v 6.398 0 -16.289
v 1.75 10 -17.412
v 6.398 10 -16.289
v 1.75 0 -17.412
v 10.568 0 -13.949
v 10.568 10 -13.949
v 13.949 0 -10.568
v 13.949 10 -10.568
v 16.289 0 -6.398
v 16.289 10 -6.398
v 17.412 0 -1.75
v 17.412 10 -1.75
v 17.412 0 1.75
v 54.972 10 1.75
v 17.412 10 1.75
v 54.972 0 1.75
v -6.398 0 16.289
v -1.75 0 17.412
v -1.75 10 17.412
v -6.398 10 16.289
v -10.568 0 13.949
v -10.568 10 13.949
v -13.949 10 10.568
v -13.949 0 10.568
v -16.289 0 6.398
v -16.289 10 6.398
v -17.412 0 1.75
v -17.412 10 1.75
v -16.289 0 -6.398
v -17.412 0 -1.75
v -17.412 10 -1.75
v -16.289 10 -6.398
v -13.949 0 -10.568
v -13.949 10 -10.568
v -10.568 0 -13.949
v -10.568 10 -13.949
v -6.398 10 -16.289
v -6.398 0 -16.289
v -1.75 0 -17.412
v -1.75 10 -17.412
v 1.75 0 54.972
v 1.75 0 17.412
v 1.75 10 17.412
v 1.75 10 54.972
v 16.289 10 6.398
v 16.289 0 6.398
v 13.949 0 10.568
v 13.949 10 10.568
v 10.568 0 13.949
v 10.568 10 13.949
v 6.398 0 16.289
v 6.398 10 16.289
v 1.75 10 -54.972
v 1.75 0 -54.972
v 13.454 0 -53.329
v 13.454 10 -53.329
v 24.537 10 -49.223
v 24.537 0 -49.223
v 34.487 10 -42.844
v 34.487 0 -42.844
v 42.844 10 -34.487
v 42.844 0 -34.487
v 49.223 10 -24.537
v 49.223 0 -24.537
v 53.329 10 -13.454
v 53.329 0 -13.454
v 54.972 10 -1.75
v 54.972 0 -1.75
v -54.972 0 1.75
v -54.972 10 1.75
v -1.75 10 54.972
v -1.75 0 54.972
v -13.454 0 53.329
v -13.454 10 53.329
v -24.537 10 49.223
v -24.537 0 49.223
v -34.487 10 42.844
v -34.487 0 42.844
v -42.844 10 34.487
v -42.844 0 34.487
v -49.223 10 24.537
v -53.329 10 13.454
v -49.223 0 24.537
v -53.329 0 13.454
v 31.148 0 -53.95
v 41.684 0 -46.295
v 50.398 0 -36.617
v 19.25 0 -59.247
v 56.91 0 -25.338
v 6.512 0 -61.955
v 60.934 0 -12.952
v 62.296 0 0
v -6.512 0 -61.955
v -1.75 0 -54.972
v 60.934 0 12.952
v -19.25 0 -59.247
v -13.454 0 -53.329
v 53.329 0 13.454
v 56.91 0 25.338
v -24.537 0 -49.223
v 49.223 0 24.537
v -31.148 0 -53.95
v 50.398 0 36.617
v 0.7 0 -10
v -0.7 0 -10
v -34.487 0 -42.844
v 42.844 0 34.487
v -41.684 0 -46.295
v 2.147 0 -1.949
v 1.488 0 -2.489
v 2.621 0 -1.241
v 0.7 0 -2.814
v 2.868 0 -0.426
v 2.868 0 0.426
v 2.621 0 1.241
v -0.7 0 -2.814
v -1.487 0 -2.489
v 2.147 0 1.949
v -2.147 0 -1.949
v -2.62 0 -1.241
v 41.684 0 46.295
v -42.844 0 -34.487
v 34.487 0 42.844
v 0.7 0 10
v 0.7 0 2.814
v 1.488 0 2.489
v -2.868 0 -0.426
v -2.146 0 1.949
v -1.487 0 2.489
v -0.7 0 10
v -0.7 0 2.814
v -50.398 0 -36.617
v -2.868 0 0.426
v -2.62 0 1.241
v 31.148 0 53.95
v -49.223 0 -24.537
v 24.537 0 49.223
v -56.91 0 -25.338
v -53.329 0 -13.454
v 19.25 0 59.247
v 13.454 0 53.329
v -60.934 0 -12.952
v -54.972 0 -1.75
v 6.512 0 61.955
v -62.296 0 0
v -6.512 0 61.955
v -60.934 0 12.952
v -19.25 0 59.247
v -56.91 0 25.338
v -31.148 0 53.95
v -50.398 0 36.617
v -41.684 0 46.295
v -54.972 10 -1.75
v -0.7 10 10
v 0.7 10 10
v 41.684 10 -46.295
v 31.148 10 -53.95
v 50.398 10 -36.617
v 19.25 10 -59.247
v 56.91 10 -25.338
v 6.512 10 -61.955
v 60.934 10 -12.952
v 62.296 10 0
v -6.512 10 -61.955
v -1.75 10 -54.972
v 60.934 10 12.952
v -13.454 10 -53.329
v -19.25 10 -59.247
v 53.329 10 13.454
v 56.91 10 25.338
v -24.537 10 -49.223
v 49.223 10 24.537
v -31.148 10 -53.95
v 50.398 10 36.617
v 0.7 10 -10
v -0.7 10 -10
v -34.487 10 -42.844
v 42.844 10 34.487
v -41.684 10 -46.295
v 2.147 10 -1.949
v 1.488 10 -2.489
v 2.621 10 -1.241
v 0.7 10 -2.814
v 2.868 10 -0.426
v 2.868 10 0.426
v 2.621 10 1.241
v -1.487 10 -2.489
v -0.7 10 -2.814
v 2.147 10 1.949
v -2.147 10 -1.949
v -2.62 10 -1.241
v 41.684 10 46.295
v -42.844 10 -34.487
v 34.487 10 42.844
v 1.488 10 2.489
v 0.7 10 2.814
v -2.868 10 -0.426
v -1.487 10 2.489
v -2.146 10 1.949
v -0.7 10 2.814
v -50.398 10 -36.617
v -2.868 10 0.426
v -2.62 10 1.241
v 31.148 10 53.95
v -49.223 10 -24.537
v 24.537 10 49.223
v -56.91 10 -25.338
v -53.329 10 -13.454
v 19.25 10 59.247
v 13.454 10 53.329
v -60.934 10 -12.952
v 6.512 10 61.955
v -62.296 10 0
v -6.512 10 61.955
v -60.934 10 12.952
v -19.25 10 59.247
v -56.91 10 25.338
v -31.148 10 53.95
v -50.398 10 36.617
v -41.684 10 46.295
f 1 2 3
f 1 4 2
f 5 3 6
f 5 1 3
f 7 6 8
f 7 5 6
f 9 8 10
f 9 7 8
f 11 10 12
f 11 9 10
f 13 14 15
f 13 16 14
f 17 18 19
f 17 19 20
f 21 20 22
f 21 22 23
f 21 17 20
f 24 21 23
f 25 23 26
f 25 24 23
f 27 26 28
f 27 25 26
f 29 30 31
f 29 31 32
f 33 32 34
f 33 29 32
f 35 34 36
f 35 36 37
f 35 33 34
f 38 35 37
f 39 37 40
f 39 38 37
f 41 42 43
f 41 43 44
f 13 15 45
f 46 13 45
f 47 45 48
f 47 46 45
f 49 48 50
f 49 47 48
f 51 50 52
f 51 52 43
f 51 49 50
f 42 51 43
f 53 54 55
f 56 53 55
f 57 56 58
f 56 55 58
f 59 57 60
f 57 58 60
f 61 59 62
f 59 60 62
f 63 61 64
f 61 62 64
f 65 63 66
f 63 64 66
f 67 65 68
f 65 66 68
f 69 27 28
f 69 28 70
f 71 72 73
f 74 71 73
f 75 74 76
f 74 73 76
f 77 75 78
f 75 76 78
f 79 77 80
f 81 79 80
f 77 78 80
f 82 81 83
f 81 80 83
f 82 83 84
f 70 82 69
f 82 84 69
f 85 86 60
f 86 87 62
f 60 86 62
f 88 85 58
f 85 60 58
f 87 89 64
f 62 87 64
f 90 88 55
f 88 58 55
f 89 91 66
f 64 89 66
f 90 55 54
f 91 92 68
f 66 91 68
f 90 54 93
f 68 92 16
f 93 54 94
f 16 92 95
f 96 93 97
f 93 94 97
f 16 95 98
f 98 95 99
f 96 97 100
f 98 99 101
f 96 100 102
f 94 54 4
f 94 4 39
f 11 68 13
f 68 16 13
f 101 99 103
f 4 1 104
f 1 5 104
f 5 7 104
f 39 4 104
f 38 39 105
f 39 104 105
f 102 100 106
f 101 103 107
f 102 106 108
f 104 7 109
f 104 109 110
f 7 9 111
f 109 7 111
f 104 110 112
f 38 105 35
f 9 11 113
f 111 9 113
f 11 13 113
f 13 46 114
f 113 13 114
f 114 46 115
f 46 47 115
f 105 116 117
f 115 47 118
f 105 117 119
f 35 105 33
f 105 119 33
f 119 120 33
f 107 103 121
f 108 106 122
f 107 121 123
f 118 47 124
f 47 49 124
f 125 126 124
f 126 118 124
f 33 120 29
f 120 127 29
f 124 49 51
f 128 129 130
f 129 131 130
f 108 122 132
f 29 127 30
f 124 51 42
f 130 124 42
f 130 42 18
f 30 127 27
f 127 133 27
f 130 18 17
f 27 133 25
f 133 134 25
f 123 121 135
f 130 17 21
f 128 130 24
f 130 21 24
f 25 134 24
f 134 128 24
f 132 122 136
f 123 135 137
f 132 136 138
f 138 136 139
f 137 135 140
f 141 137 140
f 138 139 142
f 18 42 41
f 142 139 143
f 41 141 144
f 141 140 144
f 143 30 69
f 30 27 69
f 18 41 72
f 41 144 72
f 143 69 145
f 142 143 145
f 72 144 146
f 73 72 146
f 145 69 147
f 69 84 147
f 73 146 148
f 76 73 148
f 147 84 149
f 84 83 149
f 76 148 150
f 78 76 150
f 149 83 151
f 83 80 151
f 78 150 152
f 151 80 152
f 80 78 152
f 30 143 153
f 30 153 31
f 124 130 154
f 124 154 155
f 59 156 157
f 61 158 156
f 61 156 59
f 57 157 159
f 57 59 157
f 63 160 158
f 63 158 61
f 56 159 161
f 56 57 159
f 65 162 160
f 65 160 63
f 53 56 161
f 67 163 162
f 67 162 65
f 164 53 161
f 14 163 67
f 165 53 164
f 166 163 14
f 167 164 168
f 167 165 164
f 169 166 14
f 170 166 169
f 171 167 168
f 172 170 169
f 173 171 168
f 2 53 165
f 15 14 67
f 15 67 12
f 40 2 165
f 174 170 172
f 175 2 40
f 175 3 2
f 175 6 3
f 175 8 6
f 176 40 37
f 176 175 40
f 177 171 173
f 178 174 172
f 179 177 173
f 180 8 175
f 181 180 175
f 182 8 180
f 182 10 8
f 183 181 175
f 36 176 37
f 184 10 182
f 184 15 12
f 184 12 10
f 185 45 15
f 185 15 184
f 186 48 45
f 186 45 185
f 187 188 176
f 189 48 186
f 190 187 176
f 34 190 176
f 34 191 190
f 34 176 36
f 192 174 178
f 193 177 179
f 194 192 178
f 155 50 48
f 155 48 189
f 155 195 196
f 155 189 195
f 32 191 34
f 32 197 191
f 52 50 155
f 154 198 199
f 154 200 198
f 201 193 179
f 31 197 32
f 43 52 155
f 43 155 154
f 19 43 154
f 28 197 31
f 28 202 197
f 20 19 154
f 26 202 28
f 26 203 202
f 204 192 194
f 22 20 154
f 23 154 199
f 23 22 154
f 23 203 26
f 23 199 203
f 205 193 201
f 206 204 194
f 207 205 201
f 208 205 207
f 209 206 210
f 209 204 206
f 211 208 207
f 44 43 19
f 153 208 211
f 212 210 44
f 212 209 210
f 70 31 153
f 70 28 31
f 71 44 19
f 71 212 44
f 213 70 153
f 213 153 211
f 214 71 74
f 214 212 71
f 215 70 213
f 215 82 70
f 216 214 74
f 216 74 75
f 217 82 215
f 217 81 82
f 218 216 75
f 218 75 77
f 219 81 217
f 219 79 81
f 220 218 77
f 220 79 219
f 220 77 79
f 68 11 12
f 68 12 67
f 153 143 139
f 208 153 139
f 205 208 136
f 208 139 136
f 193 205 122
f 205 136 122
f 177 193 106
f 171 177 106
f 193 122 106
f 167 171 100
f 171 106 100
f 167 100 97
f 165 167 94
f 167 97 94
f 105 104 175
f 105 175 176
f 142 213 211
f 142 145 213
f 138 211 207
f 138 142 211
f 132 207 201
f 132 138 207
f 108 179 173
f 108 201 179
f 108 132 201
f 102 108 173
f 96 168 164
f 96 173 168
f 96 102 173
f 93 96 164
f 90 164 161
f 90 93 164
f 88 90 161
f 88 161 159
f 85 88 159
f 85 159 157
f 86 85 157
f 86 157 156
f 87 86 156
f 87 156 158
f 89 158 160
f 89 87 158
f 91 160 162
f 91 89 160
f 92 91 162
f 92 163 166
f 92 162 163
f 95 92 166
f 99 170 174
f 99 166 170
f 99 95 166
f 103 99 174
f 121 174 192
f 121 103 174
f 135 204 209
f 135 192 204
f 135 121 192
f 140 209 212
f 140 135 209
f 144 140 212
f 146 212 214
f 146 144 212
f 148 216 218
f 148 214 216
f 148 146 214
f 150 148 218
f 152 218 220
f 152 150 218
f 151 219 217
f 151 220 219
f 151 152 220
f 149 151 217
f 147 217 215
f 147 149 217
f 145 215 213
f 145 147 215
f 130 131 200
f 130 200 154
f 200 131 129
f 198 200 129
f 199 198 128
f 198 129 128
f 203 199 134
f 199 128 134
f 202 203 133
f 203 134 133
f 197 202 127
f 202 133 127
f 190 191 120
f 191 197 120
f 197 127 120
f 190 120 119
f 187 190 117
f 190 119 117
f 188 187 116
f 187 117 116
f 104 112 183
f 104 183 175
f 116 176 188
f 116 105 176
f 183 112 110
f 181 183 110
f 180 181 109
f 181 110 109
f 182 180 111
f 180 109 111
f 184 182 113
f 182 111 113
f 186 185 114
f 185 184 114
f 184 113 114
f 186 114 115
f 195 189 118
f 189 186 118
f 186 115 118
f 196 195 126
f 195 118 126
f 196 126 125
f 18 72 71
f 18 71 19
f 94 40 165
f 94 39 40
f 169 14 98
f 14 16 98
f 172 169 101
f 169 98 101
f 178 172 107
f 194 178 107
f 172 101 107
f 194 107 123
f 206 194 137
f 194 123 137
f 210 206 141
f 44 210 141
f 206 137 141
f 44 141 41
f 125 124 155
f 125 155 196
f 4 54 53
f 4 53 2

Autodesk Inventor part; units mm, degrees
ref_plane "YZ Plane" through (0, 0, 0) normal (1, 0, 0) x (0, 1, 0)
ref_plane "XZ Plane" through (0, 0, 0) normal (0, 1, 0) x (-1, 0, 0)
ref_plane "XY Plane" through (0, 0, 0) normal (0, 0, 1) x (1, 0, 0)
sketch "Sketch1" plane through (0, 0, 0) normal (0, 1, 0) x (-1, 0, 0)
  circle A0 centre (0, 0) radius 62.2958
  line L0 (-0.7, -10) -> (0.7, -10)
  line L1 (0.6998, 10) -> (-0.7, 10)
  line L2 (0.7, -10) -> (0.7, -2.8135)
  line L3 (0.6998, 2.8135) -> (0.6998, 10)
  line L4 (-0.7, 10) -> (-0.7, 2.8142)
  line L5 (-0.7, -2.8142) -> (-0.7, -10)
  arc A1 (-0.7, 2.8142) -> (-0.7, -2.8142) centre (0, 0) ccw
  arc A2 (0.7, -2.8135) -> (0.6998, 2.8135) centre (0, 0) ccw
  dimension "d0" = 124.5916
  dimension "d2" = 1.4
  dimension "d6" = 20
  dimension "d7" = 10
extrude "Extrusion1" add sketch "Sketch1" along normal blind 10
sketch "Sketch4" plane through (0, 0, 0) normal (0, -1, 0) x (1, 0, 0)
  point P0 (0, 0)
sketch "Sketch6" plane through (0, 0, 0) normal (0, -1, 0) x (1, 0, 0)
  circle A0 centre (0, 0) radius 17.5
  line L0 (70.933, -2.5) -> (70.933, 2.5)
  line L1 (-76.7315, 1.75) -> (-76.7315, -1.75)
  arc A1 (-0.6998, 2.8135) -> (-0.7, -2.8135) centre (0, 0) ccw projected
  arc A2 (0.7, -2.8142) -> (0.7, 2.8142) centre (0, 0) ccw projected
  circle A3 centre (0, 0) radius 55
  line L2 (2.5, 115.1017) -> (-2.5, 115.1017)
  line L3 (-2.5, -115.1017) -> (2.5, -115.1017)
  line L4 (0.7, 10) -> (-0.6998, 10) projected
  circle A4 centre (0, 0) radius 62.2958
  line L5 (-76.7315, -1.75) -> (-17.4123, -1.75)
  line L6 (-17.4123, 1.75) -> (-76.7315, 1.75)
  line L7 (-1.4682, 2.5) -> (-1.4697, 2.5)
  line L8 (-1.75, -17.4123) -> (-1.75, -76.7315)
  line L9 (1.75, -76.7315) -> (1.75, -17.4123)
  line L10 (17.4123, -1.75) -> (76.7315, -1.75)
  line L11 (76.7315, 1.75) -> (17.4123, 1.75)
  line L12 (1.75, 17.4123) -> (1.75, 76.7315)
  line L13 (-1.75, 76.7315) -> (-1.75, 17.4123)
  point P0 (-2.8993, 0)
  point P1 (-2.5, 17.3205)
  point P2 (-2.5, -17.3205)
  point P3 (2.5, -17.3205)
  point P4 (17.3205, -2.5)
  point P5 (17.3205, 2.5)
  point P6 (2.5, 17.3205)
  point P7 (-54.9722, 1.75)
  point P8 (-54.9722, -1.75)
  point P9 (54.9722, -1.75)
  point P10 (1.75, -54.9722)
  point P11 (1.75, 54.9722)
  point P12 (54.9722, 1.75)
  point P13 (-1.75, 54.9722)
  point P14 (-1.75, -54.9722)
  dimension "d16" = 35
  dimension "d18" = 110
  dimension "d19" = 5
  dimension "d22" = 1.75
  dimension "d23" = 3.5
  dimension "d26" = 360
extrude "Extrusion2" cut sketch "Sketch6" against normal blind 10 contours A0 L12 A3 L11 | L10 A3 L9 A0 | A0 L6 A3 L13 | L8 A3 L5 A0
properties part number "Pot Disk"
